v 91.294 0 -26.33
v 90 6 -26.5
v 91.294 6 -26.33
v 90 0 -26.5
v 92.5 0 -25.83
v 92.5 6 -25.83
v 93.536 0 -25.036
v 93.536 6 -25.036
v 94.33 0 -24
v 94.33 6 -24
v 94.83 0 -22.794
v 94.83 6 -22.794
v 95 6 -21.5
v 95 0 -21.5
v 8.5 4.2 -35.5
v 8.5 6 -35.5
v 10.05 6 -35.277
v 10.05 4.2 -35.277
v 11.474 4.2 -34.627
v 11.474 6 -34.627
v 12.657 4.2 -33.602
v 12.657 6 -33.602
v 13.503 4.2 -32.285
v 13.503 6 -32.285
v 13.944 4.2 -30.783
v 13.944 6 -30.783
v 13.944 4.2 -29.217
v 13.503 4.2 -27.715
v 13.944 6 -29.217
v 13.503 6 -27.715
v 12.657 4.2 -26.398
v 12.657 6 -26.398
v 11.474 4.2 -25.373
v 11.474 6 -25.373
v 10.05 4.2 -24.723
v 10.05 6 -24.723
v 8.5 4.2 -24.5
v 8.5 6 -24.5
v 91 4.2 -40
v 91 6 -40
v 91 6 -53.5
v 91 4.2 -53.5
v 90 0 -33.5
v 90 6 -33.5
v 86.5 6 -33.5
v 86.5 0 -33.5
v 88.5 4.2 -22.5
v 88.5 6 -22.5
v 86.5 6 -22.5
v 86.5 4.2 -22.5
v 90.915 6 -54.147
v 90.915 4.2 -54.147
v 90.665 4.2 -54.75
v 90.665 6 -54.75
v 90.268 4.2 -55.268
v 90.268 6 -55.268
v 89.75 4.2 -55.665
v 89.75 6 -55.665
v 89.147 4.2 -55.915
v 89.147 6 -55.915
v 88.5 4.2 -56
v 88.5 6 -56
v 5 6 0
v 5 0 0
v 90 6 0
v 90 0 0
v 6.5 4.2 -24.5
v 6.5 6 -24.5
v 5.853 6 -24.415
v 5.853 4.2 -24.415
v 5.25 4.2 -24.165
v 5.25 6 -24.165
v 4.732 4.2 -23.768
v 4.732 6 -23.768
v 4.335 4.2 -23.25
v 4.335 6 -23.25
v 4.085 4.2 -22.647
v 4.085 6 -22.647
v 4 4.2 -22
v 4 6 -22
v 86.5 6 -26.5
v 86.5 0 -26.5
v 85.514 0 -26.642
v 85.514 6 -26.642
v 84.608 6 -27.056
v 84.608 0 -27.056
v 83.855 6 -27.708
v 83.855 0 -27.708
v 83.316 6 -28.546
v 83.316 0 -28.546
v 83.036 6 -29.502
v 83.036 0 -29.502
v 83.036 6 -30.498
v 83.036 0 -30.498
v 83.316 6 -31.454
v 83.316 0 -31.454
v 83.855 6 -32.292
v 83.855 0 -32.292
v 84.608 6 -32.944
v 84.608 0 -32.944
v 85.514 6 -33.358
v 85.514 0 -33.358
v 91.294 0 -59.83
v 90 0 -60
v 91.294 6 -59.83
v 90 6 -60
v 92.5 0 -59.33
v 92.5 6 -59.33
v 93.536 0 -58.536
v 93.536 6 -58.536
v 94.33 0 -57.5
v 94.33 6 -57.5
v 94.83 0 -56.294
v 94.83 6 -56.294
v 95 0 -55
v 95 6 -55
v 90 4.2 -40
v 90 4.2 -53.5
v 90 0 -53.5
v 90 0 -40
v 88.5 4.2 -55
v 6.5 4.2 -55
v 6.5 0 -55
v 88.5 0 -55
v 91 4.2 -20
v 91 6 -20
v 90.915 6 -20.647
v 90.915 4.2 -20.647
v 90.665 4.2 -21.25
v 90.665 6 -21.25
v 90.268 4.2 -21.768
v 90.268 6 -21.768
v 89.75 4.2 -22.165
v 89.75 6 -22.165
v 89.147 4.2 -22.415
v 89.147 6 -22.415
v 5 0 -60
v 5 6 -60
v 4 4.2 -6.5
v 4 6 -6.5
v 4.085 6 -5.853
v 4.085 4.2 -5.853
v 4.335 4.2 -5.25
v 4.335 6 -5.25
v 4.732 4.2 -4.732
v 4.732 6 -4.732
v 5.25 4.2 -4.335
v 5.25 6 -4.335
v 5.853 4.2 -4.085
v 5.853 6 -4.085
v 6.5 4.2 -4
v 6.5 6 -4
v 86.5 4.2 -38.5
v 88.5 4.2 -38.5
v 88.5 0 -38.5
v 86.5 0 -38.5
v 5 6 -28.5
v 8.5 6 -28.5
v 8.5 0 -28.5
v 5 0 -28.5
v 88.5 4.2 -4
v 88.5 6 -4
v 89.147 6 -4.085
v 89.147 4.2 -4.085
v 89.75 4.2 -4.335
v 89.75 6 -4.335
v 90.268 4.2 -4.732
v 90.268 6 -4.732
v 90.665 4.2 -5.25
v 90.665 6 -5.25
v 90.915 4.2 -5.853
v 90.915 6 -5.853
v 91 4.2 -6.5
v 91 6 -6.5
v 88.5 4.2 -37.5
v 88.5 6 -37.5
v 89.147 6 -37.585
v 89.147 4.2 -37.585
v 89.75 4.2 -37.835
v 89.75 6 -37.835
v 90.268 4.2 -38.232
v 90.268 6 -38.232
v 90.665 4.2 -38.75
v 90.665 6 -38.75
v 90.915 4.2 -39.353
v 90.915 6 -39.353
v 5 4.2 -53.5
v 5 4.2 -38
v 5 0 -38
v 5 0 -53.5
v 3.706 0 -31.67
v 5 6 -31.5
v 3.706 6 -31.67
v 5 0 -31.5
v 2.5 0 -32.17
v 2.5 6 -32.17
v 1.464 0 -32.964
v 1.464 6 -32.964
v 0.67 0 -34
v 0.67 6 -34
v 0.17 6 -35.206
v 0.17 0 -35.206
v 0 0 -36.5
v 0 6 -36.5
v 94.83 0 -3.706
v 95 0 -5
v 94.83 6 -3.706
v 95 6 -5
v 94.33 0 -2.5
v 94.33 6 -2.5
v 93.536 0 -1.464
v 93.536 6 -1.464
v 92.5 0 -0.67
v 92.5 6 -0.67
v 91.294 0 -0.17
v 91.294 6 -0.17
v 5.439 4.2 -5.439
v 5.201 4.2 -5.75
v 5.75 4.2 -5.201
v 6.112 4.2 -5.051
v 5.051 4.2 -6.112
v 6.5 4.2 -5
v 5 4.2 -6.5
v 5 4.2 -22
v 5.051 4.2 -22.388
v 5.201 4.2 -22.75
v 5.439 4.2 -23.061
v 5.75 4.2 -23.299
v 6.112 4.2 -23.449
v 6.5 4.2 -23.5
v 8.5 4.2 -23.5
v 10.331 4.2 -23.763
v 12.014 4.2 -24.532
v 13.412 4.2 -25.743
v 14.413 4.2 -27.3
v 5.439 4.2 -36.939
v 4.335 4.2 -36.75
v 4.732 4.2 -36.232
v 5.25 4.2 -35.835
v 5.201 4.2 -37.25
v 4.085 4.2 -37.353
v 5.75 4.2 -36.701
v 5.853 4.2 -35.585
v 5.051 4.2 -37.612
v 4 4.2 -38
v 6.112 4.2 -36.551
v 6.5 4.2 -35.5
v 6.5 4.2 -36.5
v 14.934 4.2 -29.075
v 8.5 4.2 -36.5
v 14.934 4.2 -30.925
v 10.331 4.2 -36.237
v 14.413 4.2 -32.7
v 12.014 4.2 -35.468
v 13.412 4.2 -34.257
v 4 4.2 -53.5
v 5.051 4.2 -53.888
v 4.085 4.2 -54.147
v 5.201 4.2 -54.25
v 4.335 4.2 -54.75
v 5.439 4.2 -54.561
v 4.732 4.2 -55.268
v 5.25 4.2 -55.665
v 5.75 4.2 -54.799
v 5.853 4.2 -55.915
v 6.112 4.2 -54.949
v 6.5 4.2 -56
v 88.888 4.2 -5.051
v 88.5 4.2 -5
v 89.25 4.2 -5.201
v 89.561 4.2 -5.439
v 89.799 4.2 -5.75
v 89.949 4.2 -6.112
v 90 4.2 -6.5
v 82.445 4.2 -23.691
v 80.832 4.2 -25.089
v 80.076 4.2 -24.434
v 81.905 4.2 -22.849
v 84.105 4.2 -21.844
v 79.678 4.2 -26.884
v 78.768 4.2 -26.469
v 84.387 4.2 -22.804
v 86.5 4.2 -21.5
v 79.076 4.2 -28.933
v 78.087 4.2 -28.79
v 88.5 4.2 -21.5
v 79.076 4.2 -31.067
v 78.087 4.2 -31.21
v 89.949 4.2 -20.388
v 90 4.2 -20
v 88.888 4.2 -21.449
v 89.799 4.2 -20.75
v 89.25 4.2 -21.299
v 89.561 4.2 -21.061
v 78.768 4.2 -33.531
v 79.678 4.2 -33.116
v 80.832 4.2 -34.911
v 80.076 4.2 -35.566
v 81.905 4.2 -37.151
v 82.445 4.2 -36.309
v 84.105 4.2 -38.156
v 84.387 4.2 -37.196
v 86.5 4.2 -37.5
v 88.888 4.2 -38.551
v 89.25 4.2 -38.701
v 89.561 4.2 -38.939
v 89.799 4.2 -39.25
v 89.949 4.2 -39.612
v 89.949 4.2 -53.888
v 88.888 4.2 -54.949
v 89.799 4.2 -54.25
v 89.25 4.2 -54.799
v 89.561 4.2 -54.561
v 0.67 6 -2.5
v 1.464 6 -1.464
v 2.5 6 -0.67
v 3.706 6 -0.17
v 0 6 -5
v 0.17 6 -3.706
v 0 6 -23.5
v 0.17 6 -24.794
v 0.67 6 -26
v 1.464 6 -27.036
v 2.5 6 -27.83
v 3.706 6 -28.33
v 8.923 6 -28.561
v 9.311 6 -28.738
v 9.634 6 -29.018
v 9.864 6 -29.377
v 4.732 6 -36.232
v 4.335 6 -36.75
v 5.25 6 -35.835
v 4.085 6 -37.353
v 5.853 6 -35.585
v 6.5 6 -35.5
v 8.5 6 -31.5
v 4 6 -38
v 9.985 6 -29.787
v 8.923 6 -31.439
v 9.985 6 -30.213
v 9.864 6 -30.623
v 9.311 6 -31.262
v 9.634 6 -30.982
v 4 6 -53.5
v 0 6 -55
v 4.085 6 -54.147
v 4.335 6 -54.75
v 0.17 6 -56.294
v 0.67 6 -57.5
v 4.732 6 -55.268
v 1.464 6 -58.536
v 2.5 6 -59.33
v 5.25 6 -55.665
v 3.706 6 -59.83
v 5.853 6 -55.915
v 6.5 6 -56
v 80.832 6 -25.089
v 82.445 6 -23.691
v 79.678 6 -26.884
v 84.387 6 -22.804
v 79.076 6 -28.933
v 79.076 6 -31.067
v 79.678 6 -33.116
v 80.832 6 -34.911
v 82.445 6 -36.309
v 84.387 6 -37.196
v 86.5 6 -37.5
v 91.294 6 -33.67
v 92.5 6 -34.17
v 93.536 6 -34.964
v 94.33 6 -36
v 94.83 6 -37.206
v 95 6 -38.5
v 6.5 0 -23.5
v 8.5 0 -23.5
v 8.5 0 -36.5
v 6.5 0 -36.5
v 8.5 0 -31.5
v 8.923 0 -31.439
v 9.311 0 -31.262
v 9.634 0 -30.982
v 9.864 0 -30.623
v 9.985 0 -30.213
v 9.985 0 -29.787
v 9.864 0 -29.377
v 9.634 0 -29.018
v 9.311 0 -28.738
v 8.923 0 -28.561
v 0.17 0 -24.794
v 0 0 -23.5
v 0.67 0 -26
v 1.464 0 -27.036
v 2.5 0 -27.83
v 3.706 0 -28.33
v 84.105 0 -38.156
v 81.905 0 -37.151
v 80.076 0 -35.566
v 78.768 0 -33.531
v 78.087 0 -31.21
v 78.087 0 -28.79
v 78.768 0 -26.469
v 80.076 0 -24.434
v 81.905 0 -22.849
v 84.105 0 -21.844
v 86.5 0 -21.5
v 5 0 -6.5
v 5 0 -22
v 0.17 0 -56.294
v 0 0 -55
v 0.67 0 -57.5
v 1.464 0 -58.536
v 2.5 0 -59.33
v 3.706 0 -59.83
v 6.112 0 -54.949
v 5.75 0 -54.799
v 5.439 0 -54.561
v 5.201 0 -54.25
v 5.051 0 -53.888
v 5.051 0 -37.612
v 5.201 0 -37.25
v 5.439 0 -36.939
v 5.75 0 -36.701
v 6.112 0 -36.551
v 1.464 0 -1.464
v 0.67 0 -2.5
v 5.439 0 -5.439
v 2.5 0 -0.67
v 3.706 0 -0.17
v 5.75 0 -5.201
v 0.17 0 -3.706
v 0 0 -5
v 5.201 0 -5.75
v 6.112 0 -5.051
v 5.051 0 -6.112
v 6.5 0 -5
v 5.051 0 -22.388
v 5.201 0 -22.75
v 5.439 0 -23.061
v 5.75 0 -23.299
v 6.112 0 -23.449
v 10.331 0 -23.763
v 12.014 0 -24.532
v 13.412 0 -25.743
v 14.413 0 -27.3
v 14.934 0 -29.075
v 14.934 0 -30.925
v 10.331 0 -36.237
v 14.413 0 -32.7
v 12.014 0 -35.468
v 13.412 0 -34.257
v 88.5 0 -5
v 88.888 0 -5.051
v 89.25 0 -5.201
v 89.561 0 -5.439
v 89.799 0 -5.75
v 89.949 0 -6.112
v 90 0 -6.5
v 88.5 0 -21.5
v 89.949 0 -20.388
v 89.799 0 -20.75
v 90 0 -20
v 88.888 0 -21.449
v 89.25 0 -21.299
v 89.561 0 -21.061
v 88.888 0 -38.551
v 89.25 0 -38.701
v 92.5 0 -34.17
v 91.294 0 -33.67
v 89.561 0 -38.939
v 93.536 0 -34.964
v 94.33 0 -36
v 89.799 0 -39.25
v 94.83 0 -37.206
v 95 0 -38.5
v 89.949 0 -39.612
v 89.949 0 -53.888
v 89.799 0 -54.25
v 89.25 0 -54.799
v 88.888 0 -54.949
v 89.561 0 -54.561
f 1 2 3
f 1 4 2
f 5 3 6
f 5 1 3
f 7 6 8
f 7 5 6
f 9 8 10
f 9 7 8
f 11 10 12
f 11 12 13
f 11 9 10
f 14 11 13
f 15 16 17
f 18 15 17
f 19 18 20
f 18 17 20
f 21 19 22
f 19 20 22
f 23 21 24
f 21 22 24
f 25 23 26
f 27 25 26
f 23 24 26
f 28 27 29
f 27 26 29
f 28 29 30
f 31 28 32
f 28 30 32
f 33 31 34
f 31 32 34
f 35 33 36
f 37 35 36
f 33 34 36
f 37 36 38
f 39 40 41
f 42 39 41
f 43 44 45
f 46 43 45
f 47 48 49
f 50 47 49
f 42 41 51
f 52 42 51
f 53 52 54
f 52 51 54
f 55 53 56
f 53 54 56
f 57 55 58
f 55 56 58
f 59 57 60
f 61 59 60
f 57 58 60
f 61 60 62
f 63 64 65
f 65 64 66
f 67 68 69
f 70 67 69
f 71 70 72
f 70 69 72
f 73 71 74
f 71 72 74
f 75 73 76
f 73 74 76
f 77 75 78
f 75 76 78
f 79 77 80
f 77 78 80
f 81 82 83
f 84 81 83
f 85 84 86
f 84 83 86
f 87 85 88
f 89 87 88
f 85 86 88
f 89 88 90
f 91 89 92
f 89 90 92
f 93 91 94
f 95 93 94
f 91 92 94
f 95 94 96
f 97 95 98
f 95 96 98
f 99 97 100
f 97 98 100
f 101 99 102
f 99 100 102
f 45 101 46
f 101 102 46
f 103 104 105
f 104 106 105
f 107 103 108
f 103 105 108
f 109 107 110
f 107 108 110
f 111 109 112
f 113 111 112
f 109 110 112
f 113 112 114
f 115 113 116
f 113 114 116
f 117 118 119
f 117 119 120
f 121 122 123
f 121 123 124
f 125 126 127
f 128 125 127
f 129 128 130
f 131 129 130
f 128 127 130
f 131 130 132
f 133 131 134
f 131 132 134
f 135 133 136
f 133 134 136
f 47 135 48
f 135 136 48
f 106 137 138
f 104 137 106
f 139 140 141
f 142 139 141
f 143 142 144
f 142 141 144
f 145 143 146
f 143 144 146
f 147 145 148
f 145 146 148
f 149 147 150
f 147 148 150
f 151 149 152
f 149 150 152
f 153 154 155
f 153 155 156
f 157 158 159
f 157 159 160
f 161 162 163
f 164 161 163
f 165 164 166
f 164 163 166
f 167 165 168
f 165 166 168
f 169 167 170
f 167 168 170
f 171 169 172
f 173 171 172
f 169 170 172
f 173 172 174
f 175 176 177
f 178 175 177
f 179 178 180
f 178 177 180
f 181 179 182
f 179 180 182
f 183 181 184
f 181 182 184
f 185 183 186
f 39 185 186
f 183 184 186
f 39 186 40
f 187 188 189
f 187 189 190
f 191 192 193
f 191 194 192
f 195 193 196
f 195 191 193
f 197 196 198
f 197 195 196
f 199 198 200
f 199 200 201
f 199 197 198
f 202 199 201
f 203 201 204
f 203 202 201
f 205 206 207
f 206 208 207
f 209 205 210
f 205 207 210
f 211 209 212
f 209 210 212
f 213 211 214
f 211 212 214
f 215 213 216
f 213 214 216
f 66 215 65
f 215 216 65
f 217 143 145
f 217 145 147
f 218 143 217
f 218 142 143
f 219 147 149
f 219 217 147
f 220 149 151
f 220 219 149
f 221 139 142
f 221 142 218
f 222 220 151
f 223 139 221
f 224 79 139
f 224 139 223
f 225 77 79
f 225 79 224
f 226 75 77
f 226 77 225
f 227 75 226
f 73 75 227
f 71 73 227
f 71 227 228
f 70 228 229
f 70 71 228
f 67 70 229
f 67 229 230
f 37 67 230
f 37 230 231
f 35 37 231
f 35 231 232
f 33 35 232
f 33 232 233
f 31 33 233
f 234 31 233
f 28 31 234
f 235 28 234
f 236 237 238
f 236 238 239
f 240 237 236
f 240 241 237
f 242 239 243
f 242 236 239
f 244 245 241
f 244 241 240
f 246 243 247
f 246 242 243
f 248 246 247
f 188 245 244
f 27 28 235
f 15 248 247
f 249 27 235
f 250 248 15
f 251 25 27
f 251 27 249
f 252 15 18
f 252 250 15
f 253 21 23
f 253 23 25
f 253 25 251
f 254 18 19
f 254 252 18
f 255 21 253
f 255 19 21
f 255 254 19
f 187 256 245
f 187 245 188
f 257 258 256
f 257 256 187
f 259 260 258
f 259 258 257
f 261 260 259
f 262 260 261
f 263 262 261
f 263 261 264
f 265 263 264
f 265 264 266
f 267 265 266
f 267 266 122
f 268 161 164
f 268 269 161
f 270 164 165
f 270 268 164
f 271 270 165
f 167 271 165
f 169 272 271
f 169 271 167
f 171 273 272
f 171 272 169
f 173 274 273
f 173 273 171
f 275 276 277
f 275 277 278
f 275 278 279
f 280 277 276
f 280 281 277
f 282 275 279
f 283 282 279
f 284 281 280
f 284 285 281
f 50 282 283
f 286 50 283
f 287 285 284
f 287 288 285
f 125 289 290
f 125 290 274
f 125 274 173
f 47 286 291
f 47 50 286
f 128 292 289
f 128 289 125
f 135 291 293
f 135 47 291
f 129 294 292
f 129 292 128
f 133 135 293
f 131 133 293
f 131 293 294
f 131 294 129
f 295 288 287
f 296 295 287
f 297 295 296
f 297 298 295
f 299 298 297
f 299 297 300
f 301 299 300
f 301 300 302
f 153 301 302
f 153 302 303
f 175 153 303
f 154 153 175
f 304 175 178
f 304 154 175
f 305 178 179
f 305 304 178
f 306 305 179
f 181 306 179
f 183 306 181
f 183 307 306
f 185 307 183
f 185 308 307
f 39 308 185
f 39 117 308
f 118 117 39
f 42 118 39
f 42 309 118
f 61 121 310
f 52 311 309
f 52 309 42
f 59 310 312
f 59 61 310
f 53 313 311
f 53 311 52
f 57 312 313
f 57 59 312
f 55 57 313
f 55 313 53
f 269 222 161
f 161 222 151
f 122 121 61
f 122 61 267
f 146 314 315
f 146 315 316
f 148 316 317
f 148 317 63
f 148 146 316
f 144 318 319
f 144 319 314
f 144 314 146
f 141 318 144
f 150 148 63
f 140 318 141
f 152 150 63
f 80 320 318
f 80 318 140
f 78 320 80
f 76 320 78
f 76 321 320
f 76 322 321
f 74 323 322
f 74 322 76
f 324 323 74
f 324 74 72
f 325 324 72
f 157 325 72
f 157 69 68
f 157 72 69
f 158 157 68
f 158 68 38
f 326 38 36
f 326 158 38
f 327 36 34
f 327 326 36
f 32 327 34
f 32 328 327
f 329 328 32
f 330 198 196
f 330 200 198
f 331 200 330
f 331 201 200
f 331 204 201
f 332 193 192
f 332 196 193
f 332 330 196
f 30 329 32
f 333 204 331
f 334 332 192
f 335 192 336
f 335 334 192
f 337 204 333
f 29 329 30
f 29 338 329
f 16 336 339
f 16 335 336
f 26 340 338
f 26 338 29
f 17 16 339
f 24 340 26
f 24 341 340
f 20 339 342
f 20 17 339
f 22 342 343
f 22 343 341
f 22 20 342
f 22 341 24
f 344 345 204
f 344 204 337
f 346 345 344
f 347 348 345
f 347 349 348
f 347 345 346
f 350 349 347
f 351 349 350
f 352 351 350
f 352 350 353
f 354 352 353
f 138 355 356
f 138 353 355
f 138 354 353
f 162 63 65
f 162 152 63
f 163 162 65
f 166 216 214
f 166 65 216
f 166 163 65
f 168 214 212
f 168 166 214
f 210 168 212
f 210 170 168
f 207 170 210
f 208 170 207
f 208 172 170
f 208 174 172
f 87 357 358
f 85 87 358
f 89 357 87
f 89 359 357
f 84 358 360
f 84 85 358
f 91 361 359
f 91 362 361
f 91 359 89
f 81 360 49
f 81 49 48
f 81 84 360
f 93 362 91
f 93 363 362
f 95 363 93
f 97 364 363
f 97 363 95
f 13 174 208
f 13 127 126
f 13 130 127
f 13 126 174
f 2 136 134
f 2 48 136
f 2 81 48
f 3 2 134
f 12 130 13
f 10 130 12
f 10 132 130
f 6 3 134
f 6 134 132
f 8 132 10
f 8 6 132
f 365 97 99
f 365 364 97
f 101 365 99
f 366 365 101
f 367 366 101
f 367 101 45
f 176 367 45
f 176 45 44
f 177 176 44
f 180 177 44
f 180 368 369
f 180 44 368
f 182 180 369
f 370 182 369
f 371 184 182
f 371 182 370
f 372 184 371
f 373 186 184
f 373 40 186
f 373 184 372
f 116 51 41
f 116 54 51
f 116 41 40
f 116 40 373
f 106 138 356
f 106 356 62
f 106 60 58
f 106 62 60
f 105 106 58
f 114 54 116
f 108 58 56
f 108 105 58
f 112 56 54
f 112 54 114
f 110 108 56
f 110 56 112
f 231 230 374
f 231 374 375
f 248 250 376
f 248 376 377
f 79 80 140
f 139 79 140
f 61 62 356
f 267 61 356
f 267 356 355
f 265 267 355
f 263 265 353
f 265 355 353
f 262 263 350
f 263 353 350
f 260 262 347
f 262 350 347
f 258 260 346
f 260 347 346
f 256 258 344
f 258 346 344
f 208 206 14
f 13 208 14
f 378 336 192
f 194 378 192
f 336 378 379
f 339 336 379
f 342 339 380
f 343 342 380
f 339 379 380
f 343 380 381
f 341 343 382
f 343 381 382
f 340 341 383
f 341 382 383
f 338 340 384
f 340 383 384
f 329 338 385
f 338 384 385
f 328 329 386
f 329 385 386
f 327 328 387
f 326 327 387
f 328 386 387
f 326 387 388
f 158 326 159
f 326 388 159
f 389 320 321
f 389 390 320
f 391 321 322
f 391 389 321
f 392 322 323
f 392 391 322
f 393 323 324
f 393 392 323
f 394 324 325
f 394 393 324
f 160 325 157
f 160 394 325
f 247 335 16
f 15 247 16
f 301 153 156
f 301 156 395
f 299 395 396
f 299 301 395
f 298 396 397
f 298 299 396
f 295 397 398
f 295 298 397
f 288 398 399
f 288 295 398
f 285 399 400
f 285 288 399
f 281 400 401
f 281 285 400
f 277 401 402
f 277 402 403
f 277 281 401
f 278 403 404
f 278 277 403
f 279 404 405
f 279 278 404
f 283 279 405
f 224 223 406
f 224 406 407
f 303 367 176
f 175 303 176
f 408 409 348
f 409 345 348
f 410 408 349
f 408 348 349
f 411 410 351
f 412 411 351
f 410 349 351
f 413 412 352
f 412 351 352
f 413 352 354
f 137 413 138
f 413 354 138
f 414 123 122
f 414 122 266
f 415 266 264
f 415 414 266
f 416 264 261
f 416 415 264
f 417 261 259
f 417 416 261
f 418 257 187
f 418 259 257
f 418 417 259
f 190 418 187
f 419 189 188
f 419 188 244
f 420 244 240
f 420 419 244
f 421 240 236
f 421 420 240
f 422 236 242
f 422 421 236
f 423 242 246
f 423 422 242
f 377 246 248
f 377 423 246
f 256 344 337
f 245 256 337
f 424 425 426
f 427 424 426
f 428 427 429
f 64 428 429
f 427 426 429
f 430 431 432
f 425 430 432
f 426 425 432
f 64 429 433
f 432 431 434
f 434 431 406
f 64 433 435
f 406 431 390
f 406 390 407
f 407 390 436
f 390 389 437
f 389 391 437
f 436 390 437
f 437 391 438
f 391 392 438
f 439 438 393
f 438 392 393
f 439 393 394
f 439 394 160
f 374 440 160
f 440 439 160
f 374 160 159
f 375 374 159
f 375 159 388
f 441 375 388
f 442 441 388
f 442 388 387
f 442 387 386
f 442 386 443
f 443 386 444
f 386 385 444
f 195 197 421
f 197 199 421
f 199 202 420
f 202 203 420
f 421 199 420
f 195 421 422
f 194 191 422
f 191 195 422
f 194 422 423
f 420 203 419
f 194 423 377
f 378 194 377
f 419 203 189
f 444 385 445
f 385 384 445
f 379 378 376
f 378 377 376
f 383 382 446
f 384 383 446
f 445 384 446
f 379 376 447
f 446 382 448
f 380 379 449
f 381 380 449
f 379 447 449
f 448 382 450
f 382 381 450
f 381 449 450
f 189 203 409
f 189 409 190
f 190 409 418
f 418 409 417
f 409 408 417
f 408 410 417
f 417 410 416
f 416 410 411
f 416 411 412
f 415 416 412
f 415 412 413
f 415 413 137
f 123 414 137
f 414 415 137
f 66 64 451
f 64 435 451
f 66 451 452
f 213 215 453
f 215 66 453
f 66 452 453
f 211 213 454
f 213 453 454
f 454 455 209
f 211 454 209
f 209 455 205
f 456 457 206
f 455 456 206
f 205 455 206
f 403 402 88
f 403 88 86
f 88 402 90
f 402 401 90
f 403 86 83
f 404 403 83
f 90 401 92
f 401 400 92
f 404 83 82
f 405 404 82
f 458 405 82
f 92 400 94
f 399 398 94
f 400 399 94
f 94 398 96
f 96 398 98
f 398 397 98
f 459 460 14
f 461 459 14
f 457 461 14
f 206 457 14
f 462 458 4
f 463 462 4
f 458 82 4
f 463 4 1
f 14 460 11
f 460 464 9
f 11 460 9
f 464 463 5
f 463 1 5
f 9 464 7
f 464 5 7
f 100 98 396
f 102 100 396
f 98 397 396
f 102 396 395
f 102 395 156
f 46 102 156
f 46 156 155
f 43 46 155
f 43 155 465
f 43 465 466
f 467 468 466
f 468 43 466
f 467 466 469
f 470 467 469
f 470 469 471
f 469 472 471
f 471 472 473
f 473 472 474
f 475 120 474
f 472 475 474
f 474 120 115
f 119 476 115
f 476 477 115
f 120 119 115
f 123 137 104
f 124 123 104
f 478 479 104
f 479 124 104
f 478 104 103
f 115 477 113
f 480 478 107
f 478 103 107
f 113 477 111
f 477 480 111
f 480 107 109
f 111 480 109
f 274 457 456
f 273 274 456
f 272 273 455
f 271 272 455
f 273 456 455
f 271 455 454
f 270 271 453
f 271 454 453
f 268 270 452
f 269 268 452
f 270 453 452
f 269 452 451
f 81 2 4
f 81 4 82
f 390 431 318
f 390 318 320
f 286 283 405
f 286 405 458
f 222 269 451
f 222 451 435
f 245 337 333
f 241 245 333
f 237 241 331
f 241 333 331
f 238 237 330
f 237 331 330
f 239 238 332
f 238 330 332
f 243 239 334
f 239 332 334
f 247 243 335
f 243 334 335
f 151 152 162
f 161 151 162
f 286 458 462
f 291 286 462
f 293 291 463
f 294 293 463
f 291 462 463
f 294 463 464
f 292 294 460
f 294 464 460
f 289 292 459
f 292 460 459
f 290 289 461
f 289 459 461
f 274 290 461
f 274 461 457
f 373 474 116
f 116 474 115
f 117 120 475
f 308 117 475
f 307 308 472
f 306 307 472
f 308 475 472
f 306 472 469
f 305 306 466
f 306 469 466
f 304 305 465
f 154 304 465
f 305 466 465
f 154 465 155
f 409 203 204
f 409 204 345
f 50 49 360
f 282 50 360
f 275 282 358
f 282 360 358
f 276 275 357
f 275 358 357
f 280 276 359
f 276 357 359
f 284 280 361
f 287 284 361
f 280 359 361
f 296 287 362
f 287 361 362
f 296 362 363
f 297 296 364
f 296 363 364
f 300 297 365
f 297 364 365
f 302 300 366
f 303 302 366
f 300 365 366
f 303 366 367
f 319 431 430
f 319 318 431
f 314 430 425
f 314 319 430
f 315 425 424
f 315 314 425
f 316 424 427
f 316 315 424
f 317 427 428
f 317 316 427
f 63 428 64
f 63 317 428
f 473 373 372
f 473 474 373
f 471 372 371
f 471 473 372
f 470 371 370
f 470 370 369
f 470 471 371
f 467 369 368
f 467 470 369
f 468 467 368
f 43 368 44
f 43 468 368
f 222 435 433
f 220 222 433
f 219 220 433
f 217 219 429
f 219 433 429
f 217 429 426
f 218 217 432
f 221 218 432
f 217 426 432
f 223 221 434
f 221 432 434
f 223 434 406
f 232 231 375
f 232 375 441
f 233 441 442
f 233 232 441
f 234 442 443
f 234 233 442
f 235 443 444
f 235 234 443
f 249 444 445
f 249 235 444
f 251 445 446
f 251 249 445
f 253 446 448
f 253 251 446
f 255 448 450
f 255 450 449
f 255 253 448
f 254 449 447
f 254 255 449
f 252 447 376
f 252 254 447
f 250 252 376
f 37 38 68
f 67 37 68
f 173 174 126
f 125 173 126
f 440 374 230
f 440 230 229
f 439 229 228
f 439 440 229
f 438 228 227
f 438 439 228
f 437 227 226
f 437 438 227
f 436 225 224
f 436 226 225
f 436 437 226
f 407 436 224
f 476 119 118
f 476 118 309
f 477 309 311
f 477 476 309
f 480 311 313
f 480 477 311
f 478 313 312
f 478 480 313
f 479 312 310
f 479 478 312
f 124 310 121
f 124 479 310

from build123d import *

# Parameters (mm, degrees)
SKETCH1_W           = 95
SKETCH1_H           = 60
BOSS_EXTRUDE1_DEPTH = 6
SKETCH6_R           = 3.5
SKETCH6_R_2         = 1.5
CUT_EXTRUDE3_DEPTH  = 113.521109131
CUT_EXTRUDE1_DEPTH  = 113.521109131
FILLET3_R           = 1.5
SKETCH7_W           = 8.5
SKETCH7_H           = 3
SKETCH7_H_2         = 7
CUT_EXTRUDE4_DEPTH  = 113.521109131
FILLET4_R           = 5
FILLET5_R           = 1.5
CUT_EXTRUDE5_DEPTH  = 1.8


with BuildPart() as part:
    # Sketch1 → Boss-Extrude1 (new body)
    with BuildSketch(Plane(origin=(0, 0, 0), x_dir=(1, 0, 0), z_dir=(0, 1, 0))):
        with Locations((47.5, 30)):
            Rectangle(SKETCH1_W, SKETCH1_H)
    extrude(amount=BOSS_EXTRUDE1_DEPTH)

    # Sketch6 → Cut-Extrude3 (cut, through all)
    with BuildSketch(Plane.XZ):
        with Locations(Location((86.5, -30, 0), (0, 0, 270))):
            Circle(SKETCH6_R)
        with Locations(Location((8.5, -30, 0), (0, 0, 270))):
            Circle(SKETCH6_R_2)
    extrude(amount=-CUT_EXTRUDE3_DEPTH, mode=Mode.SUBTRACT)

    # Sketch2 → Cut-Extrude1 (cut, through all)
    with BuildSketch(Plane(origin=(0, 6, 0), x_dir=(-1, 0, 0), z_dir=(0, 1, 0))):
        with BuildLine():
            Line((-8.5, -36.5), (-5, -36.5))
            Line((-5, -36.5), (-5, -55))
            Line((-5, -55), (-90, -55))
            Line((-90, -55), (-90, -38.5))
            Line((-90, -38.5), (-86.5, -38.5))
            ThreePointArc((-86.5, -38.5), (-78, -30), (-86.5, -21.5))
            Line((-86.5, -21.5), (-90, -21.5))
            Line((-90, -21.5), (-90, -5))
            Line((-90, -5), (-5, -5))
            Line((-5, -5), (-5, -23.5))
            Line((-5, -23.5), (-8.5, -23.5))
            ThreePointArc((-8.5, -23.5), (-15, -30), (-8.5, -36.5))
        make_face()
    extrude(amount=-CUT_EXTRUDE1_DEPTH, mode=Mode.SUBTRACT)

    # Fillet3
    fillet3_edges = [part.edges().sort_by_distance(p)[0] for p in [
        (90, 3, -55),
    ]]
    fillet(fillet3_edges, radius=FILLET3_R)

    # Sketch7 → Cut-Extrude4 (cut, through all)
    with BuildSketch(Plane(origin=(0, 6, 0), x_dir=(-1, 0, 0), z_dir=(0, 1, 0))):
        with Locations((-4.25, -30)):
            Rectangle(SKETCH7_W, SKETCH7_H)
        with Locations((-90.75, -30)):
            Rectangle(SKETCH7_W, SKETCH7_H_2)
    extrude(amount=-CUT_EXTRUDE4_DEPTH, mode=Mode.SUBTRACT)

    # Fillet4
    fillet4_edges = [part.edges().sort_by_distance(p)[0] for p in [
        (0, 3, -60),
        (95, 3, -60),
        (0, 3, -28.5),
        (95, 3, 0),
        (0, 3, -31.5),
        (0, 3, 0),
        (95, 3, -33.5),
        (95, 3, -26.5),
    ]]
    fillet(fillet4_edges, radius=FILLET4_R)

    # Fillet5
    fillet5_edges = [part.edges().sort_by_distance(p)[0] for p in [
        (5, 3, -5),
        (5, 3, -23.5),
        (5, 3, -36.5),
        (5, 3, -55),
        (90, 3, -38.5),
        (90, 3, -21.5),
        (90, 3, -5),
    ]]
    fillet(fillet5_edges, radius=FILLET5_R)

    # Sketch9 → Cut-Extrude5 (cut)
    with BuildSketch(Plane(origin=(0, 6, 0), x_dir=(1, 0, 0), z_dir=(0, 1, 0))):
        with BuildLine():
            Line((6.5, 4), (88.5, 4))
            ThreePointArc((88.5, 4), (90.267766953, 4.732233047), (91, 6.5))
            Line((91, 6.5), (91, 20))
            ThreePointArc((91, 20), (90.267766953, 21.767766953), (88.5, 22.5))
            Line((88.5, 22.5), (86.5, 22.5))
            ThreePointArc((86.5, 22.5), (79, 30), (86.5, 37.5))
            Line((86.5, 37.5), (88.5, 37.5))
            ThreePointArc((88.5, 37.5), (90.267766953, 38.232233047), (91, 40))
            Line((91, 40), (91, 53.5))
            ThreePointArc((91, 53.5), (90.267766953, 55.267766953), (88.5, 56))
            Line((88.5, 56), (6.5, 56))
            ThreePointArc((6.5, 56), (4.732233047, 55.267766953), (4, 53.5))
            Line((4, 53.5), (4, 38))
            ThreePointArc((4, 38), (4.732233047, 36.232233047), (6.5, 35.5))
            Line((6.5, 35.5), (8.5, 35.5))
            ThreePointArc((8.5, 35.5), (14, 30), (8.5, 24.5))
            Line((8.5, 24.5), (6.5, 24.5))
            ThreePointArc((6.5, 24.5), (4.732233047, 23.767766953), (4, 22))
            Line((4, 22), (4, 6.5))
            ThreePointArc((4, 6.5), (4.732233047, 4.732233047), (6.5, 4))
        make_face()
    extrude(amount=-CUT_EXTRUDE5_DEPTH, mode=Mode.SUBTRACT)


solid = part.part
